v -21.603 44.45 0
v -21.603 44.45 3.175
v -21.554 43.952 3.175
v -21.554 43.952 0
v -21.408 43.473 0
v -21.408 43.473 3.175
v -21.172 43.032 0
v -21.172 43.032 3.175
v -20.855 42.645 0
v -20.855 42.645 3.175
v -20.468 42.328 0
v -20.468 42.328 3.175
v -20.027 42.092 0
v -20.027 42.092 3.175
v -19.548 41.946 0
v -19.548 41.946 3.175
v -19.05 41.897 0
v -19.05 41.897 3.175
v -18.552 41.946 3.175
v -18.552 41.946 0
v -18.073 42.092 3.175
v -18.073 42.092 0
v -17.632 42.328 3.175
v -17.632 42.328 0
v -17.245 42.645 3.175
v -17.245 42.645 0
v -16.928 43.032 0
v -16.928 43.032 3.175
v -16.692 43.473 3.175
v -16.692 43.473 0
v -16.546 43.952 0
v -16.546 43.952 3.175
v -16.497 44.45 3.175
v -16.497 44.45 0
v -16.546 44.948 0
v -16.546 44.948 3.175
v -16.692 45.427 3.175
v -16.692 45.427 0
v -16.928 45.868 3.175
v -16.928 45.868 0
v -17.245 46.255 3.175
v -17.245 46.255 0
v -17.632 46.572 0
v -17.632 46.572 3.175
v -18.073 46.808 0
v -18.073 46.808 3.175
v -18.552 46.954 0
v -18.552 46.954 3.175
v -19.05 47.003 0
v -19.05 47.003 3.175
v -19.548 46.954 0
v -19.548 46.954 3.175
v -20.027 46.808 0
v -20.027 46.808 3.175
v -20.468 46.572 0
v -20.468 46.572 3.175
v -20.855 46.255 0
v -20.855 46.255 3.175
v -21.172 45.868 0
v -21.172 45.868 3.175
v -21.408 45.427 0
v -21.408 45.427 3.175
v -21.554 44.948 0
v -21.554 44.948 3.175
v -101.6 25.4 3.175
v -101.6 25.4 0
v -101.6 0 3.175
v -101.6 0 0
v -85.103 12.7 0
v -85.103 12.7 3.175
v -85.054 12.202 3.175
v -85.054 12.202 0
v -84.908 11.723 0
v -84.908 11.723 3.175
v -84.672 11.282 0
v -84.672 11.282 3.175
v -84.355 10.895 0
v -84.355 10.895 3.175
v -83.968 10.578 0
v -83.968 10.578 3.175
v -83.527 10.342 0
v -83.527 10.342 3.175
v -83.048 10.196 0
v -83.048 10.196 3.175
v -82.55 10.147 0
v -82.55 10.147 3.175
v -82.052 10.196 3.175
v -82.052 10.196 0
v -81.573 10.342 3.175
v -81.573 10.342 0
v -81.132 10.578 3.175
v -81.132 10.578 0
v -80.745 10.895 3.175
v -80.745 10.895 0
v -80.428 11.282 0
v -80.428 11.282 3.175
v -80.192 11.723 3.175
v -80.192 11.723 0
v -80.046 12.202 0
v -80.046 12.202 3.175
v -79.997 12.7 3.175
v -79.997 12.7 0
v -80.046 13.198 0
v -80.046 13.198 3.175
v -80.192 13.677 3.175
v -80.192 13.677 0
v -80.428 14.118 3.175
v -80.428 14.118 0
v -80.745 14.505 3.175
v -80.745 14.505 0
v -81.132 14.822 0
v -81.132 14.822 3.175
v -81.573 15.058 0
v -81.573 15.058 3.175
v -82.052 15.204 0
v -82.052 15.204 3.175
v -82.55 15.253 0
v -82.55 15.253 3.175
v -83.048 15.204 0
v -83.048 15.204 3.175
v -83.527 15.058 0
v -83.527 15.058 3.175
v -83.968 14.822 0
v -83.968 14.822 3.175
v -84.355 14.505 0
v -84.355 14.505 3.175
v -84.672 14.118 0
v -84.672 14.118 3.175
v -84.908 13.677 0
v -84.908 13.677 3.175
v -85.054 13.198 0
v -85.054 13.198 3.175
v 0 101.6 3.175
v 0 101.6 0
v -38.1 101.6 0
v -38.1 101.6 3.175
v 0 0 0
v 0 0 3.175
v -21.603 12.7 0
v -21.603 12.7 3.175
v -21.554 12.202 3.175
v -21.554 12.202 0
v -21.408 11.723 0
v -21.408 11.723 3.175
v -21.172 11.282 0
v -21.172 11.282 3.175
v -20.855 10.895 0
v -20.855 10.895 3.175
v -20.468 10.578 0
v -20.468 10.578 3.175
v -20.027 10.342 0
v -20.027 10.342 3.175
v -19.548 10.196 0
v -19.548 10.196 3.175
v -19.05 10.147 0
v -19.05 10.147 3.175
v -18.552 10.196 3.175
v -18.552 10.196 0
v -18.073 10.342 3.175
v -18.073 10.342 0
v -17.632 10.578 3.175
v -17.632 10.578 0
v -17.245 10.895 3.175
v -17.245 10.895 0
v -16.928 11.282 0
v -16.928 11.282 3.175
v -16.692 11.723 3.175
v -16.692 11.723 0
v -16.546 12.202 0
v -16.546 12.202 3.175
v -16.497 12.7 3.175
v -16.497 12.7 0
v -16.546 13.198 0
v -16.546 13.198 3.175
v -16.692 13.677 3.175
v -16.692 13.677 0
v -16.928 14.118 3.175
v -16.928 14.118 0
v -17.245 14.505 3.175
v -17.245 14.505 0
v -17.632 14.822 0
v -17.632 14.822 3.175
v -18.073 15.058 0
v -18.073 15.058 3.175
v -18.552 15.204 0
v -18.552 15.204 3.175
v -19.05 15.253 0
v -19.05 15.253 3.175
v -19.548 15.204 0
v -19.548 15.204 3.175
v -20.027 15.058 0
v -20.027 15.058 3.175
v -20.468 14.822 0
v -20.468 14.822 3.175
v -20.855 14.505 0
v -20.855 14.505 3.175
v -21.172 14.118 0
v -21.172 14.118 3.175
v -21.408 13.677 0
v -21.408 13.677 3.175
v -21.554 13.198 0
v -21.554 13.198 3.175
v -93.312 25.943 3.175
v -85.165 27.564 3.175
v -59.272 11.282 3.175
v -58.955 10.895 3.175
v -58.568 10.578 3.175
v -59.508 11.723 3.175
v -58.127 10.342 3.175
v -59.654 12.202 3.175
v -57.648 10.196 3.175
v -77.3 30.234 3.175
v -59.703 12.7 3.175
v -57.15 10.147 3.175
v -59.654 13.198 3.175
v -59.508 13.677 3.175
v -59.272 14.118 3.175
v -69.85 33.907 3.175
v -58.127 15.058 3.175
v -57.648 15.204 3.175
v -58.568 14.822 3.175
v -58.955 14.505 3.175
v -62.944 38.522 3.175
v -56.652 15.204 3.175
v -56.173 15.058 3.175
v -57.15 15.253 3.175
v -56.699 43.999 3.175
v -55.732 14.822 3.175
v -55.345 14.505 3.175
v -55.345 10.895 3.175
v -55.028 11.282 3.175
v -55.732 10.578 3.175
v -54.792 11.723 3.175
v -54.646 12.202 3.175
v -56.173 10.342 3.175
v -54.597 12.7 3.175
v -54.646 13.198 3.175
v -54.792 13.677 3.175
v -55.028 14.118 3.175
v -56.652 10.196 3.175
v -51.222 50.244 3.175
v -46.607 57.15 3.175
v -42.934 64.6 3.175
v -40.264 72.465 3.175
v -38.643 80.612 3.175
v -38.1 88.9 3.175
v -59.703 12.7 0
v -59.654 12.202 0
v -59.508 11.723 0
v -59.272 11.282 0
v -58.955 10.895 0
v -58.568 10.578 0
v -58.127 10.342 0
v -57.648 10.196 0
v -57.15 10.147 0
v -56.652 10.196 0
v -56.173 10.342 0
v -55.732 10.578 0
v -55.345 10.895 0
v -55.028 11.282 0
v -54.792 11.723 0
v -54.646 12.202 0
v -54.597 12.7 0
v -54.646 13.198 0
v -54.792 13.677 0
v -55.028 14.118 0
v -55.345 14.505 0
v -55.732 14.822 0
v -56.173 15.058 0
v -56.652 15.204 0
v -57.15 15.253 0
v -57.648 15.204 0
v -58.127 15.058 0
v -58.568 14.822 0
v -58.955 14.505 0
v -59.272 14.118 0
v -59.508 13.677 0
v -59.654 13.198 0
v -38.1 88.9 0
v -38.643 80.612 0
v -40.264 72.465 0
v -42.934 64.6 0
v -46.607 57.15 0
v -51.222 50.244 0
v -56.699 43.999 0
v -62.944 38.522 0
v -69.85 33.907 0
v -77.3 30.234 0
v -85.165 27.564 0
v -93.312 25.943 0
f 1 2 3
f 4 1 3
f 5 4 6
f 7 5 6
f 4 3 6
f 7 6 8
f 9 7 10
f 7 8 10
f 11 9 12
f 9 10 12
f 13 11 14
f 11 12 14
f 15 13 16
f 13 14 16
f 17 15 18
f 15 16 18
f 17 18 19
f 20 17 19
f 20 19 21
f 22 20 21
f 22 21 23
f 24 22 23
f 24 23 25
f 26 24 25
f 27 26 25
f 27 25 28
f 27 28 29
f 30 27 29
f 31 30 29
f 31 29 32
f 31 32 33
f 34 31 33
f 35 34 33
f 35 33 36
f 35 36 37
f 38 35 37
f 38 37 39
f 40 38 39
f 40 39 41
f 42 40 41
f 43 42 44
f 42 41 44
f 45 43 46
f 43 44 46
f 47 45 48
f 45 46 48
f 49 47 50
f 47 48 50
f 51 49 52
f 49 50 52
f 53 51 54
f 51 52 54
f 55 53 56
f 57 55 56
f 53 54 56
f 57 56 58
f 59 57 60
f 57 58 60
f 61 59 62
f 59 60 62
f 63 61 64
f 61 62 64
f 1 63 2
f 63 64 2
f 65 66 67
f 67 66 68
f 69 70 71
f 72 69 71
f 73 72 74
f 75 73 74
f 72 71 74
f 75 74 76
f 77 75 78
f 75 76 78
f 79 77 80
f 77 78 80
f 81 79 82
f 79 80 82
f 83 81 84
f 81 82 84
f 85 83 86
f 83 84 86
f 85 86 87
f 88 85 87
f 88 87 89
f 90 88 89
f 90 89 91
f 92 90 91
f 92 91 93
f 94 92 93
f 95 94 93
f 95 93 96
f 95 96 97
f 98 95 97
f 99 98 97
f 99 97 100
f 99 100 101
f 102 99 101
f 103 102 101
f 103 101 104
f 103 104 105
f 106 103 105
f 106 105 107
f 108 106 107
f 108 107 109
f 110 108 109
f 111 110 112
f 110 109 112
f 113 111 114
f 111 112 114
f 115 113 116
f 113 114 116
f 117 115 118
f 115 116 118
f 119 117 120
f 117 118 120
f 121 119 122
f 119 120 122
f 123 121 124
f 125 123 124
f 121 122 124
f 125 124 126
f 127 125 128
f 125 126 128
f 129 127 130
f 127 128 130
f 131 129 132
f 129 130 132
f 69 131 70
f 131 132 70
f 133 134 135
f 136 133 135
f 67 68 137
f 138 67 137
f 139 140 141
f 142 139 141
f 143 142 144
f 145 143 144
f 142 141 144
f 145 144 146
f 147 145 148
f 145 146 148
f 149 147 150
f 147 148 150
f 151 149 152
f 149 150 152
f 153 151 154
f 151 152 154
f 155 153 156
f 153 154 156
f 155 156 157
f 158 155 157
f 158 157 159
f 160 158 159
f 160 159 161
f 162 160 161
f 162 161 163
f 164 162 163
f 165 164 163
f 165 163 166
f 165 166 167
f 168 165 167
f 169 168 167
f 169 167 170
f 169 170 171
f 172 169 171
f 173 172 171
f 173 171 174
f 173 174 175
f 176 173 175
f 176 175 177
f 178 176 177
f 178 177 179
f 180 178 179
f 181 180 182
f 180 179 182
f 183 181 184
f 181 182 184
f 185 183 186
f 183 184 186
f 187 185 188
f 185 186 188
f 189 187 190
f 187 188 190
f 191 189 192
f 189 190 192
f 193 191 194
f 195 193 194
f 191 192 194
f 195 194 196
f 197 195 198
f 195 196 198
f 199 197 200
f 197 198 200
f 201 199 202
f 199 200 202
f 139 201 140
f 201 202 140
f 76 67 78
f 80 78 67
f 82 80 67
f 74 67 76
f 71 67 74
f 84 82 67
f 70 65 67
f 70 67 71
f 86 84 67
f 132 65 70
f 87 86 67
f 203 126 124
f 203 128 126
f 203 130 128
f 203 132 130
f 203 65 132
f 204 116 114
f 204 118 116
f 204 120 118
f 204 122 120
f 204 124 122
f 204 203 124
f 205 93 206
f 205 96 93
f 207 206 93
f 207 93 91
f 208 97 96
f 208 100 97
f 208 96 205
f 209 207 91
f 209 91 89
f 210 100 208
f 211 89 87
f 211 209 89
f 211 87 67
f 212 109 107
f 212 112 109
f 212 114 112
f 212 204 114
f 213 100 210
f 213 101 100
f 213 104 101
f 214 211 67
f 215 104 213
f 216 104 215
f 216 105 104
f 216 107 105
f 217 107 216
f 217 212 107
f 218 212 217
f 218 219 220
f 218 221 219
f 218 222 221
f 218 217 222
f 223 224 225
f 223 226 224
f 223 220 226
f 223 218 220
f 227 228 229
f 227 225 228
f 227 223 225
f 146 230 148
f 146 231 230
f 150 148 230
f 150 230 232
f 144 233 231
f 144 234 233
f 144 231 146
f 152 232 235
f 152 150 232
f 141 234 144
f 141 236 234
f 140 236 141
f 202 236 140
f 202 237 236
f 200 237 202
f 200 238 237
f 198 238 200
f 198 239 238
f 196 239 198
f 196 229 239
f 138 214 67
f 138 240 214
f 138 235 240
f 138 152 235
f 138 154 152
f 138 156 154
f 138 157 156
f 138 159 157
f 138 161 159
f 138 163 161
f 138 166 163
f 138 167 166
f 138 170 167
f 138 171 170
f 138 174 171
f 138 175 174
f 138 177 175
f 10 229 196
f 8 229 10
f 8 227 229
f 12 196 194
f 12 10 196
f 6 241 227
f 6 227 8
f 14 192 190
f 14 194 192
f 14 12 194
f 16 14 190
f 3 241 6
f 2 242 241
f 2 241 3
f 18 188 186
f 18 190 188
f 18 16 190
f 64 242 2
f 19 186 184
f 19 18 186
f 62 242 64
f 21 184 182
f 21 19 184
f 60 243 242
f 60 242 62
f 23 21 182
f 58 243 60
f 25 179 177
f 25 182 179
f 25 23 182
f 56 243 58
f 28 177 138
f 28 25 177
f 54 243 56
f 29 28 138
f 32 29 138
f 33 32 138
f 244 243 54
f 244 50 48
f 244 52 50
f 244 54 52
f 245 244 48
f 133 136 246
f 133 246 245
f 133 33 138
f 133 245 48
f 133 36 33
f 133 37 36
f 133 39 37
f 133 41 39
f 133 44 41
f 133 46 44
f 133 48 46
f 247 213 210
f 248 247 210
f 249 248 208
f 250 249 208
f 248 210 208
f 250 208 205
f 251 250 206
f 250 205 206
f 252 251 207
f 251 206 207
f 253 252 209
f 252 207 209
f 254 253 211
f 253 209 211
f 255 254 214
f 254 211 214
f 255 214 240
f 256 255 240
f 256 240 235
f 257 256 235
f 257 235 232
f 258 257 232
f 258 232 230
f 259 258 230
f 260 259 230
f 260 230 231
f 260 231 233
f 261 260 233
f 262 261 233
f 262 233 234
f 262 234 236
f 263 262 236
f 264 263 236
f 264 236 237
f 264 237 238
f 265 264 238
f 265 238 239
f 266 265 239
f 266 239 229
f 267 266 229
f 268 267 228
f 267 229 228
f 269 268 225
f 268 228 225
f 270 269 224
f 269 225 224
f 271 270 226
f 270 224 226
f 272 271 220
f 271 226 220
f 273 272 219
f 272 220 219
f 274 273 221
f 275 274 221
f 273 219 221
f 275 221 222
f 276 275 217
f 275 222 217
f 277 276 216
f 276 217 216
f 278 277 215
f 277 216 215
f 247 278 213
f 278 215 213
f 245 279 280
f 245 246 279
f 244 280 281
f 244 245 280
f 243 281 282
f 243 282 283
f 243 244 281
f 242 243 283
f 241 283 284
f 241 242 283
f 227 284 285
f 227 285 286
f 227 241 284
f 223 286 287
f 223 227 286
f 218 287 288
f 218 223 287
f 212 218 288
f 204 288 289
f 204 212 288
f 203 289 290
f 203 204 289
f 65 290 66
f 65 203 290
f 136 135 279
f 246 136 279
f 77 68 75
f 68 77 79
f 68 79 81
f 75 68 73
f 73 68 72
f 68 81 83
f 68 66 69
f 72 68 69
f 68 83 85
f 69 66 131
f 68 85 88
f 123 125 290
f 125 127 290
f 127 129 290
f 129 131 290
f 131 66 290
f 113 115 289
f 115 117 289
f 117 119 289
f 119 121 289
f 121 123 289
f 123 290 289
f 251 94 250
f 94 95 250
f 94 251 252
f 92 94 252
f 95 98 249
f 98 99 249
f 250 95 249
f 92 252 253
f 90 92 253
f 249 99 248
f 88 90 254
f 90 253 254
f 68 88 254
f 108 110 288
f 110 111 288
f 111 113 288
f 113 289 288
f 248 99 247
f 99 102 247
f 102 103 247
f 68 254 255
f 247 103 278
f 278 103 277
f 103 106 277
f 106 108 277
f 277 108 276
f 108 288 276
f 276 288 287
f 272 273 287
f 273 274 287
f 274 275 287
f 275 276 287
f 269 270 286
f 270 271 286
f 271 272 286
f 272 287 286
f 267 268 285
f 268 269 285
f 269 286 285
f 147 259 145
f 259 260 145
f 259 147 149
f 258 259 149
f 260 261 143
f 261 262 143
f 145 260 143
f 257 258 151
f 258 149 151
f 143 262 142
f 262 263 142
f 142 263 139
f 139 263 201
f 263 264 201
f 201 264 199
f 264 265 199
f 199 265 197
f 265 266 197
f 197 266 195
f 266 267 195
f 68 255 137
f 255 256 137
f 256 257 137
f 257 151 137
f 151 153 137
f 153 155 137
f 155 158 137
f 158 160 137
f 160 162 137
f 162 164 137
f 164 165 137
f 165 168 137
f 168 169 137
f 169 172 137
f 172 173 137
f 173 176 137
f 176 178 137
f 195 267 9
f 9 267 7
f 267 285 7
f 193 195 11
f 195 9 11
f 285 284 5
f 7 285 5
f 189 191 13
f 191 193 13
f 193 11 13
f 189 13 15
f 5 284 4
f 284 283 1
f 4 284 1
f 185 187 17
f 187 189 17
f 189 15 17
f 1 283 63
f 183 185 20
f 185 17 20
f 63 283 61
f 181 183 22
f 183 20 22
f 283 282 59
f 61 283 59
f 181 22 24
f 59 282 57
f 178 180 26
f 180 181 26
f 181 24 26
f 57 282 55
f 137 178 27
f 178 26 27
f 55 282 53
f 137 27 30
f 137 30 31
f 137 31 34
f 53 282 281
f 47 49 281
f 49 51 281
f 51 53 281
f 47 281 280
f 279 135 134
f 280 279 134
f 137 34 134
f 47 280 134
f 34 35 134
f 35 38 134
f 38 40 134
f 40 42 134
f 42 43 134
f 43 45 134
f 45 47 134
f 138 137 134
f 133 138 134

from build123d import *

# Parameters (mm, degrees)
F1_DEPTH = 3.175
F2_R     = 63.49999
F3_D     = 5.1054


# Not quite as in the source:
# - a fillet or chamfer is up to 0.001 mm smaller than in the source, because OpenCascade refuses the exact size


with BuildPart() as f1:
    # F0 (on Top) → F1 (new body)
    with BuildSketch(Plane.XY):
        Polygon((-101.6, 0), (0, 0), (0, 101.6), (-38.1, 101.6), (-38.1, 25.4), (-101.6, 25.4), align=None)
    extrude(amount=F1_DEPTH)

    # F2 (radius 63.5 in the source; OpenCascade refuses exactly that, so slightly less here)
    f2_edges = [f1.edges().sort_by_distance(p)[0] for p in [
        (-38.1, 25.4, 1.5875),
    ]]
    fillet(f2_edges, radius=F2_R)

    # F3 (through all)
    with Locations(Plane(origin=(0, 0, 0), x_dir=(1, 0, 0), z_dir=(0, 0, -1))):
        with Locations((-82.55, -12.7), (-57.15, -12.7), (-19.05, -12.7), (-19.05, -44.45)):
            Hole(F3_D / 2)


solid = f1.part
